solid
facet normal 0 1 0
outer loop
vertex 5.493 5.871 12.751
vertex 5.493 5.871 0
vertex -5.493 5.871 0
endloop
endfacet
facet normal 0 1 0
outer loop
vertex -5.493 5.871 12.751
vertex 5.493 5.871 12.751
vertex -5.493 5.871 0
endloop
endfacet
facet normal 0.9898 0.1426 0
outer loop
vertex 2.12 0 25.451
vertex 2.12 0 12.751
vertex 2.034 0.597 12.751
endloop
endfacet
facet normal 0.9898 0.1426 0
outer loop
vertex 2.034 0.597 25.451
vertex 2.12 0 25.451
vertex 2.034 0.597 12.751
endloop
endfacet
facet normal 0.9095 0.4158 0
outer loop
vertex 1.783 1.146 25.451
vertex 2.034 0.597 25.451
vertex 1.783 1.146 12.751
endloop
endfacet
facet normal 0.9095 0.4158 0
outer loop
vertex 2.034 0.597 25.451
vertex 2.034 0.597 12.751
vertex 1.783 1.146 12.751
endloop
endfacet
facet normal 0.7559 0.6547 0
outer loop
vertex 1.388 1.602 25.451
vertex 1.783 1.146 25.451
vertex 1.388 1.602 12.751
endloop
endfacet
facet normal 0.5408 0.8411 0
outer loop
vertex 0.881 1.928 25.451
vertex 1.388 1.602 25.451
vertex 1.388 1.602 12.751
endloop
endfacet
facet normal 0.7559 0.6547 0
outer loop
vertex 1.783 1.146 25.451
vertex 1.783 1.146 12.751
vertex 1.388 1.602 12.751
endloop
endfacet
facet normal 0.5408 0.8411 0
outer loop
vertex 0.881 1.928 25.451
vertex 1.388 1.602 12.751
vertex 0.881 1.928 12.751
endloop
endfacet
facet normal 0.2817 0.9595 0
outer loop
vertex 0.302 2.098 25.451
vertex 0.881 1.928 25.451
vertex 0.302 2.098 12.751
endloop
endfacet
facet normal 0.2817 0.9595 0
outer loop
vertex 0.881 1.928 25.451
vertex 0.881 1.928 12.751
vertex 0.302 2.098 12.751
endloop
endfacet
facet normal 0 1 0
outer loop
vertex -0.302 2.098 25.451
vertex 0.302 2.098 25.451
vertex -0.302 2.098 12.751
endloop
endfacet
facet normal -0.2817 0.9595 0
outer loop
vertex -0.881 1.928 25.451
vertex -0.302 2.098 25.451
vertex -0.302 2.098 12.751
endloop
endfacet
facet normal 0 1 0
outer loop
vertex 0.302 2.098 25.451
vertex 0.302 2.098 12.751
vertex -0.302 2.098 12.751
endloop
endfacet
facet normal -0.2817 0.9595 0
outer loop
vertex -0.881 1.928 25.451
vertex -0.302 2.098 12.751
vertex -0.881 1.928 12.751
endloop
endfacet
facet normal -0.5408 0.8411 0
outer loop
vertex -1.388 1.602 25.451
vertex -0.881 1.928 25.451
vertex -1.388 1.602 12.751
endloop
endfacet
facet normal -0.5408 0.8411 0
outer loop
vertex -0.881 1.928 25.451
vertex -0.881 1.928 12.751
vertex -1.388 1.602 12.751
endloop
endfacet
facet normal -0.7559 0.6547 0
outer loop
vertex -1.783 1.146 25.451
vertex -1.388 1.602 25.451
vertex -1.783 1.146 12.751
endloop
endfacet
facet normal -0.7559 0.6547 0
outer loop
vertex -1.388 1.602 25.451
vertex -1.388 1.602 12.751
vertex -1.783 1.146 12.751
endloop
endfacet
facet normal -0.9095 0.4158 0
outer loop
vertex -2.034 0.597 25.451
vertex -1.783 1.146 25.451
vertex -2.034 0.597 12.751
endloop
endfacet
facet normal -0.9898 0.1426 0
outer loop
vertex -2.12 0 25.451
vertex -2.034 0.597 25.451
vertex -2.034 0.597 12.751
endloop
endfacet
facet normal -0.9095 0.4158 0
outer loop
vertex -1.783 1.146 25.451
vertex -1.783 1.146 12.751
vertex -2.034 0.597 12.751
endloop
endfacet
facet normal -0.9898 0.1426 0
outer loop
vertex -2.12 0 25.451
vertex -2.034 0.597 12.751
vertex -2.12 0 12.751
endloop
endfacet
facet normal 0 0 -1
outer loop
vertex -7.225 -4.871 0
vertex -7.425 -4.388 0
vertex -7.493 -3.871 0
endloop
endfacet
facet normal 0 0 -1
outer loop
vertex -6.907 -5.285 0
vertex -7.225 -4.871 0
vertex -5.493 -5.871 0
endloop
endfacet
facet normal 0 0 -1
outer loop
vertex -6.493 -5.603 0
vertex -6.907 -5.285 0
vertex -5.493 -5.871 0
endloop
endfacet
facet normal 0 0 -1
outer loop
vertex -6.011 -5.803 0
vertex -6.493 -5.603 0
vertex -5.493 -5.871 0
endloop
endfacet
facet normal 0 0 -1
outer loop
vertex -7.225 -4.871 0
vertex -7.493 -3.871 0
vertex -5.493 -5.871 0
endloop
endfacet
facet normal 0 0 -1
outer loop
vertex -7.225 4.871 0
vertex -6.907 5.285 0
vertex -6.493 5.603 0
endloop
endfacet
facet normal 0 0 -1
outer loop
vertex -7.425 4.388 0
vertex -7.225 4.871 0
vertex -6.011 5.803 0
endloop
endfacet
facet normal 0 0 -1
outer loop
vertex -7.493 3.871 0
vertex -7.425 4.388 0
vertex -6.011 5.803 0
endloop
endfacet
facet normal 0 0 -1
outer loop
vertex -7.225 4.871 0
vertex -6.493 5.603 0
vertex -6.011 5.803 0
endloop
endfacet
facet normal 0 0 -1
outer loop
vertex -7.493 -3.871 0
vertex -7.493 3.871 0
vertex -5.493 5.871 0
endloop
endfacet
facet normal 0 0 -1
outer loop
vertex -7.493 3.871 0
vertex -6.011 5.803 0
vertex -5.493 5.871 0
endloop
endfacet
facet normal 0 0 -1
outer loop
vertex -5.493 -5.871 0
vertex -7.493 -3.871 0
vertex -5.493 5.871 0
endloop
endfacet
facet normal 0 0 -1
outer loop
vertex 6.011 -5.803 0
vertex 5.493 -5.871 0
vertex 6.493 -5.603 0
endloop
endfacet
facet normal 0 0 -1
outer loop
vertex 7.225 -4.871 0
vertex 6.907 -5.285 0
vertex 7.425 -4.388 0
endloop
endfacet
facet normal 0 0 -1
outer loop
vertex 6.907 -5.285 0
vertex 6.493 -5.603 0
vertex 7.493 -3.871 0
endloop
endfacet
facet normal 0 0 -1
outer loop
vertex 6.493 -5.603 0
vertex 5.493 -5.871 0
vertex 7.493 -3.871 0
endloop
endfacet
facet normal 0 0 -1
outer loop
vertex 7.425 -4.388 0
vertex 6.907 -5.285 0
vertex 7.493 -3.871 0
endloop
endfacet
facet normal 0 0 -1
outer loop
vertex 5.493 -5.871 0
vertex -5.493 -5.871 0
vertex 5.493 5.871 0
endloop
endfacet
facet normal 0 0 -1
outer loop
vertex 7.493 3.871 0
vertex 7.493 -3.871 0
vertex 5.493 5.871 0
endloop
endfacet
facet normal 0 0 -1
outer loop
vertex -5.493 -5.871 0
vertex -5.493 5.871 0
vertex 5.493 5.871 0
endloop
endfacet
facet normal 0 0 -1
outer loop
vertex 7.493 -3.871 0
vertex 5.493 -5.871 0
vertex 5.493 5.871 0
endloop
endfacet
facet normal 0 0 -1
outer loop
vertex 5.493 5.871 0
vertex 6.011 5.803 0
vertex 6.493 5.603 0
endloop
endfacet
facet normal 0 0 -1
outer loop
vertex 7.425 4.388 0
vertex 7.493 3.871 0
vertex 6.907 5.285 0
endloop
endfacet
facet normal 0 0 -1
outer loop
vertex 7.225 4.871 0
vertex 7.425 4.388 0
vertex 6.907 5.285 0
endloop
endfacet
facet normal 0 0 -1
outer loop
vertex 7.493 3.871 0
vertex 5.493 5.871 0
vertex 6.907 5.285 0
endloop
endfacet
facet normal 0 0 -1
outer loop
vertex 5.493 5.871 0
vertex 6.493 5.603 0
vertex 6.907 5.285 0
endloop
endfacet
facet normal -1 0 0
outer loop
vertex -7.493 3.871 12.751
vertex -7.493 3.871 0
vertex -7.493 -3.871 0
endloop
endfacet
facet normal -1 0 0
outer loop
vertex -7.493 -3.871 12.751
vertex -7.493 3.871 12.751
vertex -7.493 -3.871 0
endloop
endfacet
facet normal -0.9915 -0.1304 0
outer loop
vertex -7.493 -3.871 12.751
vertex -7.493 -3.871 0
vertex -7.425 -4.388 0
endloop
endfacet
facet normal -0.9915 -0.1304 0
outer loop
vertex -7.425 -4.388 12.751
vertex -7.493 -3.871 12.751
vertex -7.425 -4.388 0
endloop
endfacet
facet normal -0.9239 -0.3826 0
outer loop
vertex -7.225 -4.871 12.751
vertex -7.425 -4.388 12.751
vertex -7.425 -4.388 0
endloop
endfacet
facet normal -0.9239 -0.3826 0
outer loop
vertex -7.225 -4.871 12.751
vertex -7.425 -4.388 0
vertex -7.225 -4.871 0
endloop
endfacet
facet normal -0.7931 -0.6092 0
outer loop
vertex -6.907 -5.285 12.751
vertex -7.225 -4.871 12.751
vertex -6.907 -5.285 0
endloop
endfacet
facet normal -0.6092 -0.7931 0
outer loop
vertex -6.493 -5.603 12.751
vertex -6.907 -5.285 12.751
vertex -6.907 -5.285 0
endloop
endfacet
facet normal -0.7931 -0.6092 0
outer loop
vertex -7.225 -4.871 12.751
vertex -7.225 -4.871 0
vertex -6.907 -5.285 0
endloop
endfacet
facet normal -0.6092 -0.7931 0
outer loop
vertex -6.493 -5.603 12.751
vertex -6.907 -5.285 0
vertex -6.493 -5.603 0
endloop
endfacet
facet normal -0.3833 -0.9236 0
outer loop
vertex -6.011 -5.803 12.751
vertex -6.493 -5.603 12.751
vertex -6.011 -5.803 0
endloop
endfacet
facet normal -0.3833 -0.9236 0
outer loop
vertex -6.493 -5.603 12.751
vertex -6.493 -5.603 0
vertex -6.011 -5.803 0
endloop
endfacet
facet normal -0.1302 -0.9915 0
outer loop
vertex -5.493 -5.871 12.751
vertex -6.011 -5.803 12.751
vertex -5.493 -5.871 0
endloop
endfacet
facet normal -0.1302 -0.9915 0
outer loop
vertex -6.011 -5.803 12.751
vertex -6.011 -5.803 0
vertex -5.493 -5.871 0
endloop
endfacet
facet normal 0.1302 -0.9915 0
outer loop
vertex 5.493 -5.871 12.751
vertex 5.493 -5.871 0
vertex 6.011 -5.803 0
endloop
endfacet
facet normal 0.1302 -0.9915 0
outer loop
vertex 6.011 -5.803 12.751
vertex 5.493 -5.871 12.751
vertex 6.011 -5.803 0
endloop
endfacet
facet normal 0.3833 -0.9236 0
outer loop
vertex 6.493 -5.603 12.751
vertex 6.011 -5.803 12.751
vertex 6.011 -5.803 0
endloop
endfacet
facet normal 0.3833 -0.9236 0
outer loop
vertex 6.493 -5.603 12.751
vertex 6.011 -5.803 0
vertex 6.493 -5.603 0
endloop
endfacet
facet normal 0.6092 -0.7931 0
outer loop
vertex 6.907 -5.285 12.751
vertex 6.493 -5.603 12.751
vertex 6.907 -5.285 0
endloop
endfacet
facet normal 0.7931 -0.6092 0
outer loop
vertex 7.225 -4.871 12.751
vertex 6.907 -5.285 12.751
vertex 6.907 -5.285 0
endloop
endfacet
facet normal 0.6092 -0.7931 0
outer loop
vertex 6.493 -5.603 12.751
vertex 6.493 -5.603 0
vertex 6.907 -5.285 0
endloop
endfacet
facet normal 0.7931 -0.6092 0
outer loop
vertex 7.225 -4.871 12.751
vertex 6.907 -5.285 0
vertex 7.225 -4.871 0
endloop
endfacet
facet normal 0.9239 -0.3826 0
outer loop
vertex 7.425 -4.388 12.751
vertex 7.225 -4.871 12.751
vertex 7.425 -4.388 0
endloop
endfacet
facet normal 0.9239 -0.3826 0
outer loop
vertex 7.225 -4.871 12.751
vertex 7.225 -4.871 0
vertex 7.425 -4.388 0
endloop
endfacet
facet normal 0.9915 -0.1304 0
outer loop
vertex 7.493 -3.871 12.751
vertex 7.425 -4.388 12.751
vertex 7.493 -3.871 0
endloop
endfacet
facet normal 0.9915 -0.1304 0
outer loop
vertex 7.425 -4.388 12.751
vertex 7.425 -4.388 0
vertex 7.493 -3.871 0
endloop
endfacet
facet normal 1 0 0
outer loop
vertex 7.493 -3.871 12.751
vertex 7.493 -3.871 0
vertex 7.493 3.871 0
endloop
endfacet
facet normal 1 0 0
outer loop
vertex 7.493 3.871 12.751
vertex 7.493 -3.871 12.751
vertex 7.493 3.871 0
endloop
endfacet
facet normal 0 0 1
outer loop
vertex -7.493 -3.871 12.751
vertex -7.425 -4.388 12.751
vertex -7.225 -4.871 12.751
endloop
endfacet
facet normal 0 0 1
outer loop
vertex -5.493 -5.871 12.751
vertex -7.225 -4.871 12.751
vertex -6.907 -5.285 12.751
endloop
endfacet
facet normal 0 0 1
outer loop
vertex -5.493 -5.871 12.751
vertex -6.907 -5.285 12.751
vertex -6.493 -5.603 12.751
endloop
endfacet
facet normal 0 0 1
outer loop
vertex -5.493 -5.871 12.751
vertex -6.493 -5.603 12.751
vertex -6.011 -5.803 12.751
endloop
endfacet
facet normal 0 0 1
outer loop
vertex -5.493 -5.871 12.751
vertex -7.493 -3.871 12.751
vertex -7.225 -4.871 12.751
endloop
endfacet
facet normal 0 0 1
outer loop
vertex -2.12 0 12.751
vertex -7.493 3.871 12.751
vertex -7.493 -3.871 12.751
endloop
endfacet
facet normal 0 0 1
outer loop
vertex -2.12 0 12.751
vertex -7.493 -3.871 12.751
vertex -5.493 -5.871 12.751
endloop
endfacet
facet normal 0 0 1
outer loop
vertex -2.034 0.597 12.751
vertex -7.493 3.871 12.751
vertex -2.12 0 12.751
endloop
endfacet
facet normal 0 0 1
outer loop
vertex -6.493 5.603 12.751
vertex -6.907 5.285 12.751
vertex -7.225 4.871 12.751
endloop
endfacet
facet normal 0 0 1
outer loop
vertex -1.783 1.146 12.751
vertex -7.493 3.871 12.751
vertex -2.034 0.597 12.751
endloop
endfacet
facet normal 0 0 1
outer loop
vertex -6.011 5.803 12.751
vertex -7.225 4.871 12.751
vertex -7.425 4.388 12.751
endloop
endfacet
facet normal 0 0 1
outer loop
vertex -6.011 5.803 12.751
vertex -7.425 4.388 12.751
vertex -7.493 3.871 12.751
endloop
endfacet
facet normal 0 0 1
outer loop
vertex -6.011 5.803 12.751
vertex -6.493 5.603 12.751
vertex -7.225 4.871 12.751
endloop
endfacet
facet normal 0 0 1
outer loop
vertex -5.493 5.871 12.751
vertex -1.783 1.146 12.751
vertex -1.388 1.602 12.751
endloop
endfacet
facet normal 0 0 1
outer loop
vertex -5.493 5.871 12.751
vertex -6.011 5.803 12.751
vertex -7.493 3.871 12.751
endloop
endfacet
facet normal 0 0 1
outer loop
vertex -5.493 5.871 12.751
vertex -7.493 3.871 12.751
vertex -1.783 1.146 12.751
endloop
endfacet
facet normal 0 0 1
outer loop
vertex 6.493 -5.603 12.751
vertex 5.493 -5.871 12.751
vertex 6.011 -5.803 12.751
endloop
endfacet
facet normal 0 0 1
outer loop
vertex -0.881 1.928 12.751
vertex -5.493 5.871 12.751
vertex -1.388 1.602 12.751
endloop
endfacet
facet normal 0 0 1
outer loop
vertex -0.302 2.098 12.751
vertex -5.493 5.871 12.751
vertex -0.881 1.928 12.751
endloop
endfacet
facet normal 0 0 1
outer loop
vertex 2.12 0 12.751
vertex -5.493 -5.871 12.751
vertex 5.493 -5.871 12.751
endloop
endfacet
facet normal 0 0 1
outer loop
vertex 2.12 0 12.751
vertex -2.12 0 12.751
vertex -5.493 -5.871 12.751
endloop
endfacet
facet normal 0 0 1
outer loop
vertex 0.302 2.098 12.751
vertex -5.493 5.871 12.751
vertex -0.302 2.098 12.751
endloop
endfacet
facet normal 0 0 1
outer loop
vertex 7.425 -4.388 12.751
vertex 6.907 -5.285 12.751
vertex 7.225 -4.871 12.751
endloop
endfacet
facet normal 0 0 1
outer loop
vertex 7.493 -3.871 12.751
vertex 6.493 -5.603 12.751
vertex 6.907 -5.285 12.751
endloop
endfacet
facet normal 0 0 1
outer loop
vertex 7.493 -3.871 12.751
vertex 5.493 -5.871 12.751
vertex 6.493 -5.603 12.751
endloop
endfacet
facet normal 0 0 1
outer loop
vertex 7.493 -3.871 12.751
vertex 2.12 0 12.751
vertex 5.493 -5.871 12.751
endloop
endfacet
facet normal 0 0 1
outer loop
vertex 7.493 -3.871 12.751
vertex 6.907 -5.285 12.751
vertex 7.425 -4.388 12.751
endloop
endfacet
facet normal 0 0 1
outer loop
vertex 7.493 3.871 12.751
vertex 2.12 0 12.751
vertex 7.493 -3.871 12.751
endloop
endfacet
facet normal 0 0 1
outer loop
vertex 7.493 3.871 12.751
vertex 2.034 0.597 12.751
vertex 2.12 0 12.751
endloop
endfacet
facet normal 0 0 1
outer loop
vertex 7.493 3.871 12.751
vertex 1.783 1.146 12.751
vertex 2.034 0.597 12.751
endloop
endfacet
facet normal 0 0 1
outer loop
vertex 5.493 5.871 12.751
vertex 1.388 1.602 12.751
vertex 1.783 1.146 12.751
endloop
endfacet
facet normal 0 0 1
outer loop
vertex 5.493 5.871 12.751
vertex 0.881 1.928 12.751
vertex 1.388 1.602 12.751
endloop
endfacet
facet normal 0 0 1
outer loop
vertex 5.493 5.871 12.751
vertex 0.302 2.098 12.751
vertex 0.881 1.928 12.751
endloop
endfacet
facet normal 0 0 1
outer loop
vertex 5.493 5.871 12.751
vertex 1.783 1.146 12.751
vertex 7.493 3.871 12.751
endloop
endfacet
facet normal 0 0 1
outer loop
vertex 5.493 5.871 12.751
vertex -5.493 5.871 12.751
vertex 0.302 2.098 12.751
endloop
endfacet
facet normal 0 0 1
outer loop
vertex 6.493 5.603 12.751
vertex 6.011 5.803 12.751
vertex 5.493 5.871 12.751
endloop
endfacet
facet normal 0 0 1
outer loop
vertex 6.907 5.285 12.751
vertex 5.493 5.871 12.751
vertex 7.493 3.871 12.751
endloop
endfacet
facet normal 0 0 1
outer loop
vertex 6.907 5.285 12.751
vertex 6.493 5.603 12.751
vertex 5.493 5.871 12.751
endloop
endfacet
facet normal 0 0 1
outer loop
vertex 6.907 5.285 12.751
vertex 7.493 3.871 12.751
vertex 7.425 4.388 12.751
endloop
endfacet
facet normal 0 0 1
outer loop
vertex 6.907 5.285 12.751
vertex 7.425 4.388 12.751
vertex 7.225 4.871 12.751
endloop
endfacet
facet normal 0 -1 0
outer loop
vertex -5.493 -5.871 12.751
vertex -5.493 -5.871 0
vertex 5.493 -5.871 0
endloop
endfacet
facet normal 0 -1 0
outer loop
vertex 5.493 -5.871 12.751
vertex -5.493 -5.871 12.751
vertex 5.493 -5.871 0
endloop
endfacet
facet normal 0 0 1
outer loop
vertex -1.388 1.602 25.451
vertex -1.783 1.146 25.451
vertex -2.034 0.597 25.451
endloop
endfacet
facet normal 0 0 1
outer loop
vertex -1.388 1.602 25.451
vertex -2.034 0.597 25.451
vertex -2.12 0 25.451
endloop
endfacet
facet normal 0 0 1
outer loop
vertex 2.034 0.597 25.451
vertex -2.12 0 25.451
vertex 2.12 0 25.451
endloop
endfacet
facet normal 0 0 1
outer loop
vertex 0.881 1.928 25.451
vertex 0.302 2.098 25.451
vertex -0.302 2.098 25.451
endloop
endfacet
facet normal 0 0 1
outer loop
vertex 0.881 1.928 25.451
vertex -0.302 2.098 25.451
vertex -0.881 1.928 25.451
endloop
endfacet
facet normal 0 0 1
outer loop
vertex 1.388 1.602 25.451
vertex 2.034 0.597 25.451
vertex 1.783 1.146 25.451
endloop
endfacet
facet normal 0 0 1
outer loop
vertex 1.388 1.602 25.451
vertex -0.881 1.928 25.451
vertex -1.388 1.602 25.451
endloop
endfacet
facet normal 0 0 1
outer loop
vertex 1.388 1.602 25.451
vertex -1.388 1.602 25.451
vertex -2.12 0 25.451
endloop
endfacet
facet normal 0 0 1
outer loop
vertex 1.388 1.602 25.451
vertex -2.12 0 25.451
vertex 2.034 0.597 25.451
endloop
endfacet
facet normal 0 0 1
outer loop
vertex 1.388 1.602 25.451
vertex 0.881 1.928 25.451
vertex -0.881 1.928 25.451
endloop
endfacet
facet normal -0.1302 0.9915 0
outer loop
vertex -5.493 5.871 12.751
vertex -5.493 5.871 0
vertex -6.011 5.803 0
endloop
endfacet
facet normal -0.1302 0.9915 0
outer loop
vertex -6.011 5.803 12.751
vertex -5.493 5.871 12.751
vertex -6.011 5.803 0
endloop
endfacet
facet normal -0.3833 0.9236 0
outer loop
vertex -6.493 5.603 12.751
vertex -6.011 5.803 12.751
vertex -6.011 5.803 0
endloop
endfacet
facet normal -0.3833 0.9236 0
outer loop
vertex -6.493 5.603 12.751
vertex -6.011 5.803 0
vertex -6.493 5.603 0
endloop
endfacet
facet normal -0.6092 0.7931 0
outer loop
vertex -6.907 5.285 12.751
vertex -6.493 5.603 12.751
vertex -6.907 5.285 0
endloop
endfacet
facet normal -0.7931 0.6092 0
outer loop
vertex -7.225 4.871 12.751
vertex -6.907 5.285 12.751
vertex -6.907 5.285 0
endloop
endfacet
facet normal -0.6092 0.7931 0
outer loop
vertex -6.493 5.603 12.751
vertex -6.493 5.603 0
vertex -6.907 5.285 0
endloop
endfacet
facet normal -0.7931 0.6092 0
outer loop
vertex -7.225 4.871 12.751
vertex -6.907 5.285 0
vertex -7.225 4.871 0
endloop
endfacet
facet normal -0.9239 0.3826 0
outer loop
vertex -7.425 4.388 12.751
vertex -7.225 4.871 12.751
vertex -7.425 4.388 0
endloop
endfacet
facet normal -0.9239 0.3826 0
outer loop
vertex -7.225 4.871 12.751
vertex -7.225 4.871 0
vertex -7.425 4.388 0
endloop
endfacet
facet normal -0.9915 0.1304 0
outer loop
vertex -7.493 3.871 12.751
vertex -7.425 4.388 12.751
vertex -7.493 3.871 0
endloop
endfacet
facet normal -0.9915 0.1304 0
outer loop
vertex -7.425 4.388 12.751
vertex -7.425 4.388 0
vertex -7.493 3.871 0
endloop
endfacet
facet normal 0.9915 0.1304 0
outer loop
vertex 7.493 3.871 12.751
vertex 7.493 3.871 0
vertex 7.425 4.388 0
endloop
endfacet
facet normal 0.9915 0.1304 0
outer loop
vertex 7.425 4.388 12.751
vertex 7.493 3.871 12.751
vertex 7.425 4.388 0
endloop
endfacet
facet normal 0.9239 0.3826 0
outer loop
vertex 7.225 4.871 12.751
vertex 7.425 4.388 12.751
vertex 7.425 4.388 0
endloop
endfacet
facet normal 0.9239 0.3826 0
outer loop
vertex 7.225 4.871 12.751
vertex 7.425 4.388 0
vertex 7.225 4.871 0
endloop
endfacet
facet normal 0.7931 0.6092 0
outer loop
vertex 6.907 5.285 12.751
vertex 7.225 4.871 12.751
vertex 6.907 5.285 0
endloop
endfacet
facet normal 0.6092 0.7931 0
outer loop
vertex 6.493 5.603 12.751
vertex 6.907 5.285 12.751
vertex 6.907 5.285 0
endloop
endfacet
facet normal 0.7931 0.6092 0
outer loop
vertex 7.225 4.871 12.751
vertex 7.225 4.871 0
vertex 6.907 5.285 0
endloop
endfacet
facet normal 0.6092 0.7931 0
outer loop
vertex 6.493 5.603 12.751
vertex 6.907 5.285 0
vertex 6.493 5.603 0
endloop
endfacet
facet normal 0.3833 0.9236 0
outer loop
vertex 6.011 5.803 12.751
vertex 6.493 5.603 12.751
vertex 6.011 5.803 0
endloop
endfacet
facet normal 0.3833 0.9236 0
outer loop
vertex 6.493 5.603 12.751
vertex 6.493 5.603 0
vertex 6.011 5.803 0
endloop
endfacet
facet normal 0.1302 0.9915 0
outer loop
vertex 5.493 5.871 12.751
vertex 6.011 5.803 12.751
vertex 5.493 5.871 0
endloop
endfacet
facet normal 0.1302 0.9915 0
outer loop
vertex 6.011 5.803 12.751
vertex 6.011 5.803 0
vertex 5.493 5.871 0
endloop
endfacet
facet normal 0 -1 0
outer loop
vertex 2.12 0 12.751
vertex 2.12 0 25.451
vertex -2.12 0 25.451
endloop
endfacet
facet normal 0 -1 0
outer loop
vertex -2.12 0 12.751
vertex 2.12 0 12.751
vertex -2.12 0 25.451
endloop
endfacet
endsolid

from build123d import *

# Parameters (mm, degrees)
F1_DEPTH = 12.7508
F2_R     = 2.119579
F3_DEPTH = 12.7
F5_DEPTH = 12.7


with BuildPart() as f1:
    # F0 (on Top) → F1 (new body)
    with BuildSketch(Plane.XY):
        with BuildLine():
            Line((5.493004, 5.870853), (-5.493004, 5.870853))
            ThreePointArc((-5.493004, 5.870853), (-6.907215, 5.285067), (-7.493, 3.870857))
            Line((-7.493, 3.870857), (-7.493, -3.870857))
            ThreePointArc((-7.493, -3.870857), (-6.907215, -5.285067), (-5.493004, -5.870853))
            Line((-5.493004, -5.870853), (5.493004, -5.870853))
            ThreePointArc((5.493004, -5.870853), (6.907215, -5.285067), (7.493, -3.870857))
            Line((7.493, -3.870857), (7.493, 3.870857))
            ThreePointArc((7.493, 3.870857), (6.907215, 5.285067), (5.493004, 5.870853))
        make_face()
    extrude(amount=F1_DEPTH)

    # F2 (on face) → F3 (join)
    with BuildSketch(Plane.XY.offset(12.7508)):
        Circle(F2_R)
    extrude(amount=F3_DEPTH)

    # F4 (on face) → F5 (cut)
    with BuildSketch(Plane.XY.offset(25.4508)):
        with BuildLine():
            Line((2.119579, 0), (0, 0))
            Line((0, 0), (-2.119579, 0))
            ThreePointArc((-2.119579, 0), (0, -2.119579), (2.119579, 0))
        make_face()
    extrude(amount=-F5_DEPTH, mode=Mode.SUBTRACT)


solid = f1.part
